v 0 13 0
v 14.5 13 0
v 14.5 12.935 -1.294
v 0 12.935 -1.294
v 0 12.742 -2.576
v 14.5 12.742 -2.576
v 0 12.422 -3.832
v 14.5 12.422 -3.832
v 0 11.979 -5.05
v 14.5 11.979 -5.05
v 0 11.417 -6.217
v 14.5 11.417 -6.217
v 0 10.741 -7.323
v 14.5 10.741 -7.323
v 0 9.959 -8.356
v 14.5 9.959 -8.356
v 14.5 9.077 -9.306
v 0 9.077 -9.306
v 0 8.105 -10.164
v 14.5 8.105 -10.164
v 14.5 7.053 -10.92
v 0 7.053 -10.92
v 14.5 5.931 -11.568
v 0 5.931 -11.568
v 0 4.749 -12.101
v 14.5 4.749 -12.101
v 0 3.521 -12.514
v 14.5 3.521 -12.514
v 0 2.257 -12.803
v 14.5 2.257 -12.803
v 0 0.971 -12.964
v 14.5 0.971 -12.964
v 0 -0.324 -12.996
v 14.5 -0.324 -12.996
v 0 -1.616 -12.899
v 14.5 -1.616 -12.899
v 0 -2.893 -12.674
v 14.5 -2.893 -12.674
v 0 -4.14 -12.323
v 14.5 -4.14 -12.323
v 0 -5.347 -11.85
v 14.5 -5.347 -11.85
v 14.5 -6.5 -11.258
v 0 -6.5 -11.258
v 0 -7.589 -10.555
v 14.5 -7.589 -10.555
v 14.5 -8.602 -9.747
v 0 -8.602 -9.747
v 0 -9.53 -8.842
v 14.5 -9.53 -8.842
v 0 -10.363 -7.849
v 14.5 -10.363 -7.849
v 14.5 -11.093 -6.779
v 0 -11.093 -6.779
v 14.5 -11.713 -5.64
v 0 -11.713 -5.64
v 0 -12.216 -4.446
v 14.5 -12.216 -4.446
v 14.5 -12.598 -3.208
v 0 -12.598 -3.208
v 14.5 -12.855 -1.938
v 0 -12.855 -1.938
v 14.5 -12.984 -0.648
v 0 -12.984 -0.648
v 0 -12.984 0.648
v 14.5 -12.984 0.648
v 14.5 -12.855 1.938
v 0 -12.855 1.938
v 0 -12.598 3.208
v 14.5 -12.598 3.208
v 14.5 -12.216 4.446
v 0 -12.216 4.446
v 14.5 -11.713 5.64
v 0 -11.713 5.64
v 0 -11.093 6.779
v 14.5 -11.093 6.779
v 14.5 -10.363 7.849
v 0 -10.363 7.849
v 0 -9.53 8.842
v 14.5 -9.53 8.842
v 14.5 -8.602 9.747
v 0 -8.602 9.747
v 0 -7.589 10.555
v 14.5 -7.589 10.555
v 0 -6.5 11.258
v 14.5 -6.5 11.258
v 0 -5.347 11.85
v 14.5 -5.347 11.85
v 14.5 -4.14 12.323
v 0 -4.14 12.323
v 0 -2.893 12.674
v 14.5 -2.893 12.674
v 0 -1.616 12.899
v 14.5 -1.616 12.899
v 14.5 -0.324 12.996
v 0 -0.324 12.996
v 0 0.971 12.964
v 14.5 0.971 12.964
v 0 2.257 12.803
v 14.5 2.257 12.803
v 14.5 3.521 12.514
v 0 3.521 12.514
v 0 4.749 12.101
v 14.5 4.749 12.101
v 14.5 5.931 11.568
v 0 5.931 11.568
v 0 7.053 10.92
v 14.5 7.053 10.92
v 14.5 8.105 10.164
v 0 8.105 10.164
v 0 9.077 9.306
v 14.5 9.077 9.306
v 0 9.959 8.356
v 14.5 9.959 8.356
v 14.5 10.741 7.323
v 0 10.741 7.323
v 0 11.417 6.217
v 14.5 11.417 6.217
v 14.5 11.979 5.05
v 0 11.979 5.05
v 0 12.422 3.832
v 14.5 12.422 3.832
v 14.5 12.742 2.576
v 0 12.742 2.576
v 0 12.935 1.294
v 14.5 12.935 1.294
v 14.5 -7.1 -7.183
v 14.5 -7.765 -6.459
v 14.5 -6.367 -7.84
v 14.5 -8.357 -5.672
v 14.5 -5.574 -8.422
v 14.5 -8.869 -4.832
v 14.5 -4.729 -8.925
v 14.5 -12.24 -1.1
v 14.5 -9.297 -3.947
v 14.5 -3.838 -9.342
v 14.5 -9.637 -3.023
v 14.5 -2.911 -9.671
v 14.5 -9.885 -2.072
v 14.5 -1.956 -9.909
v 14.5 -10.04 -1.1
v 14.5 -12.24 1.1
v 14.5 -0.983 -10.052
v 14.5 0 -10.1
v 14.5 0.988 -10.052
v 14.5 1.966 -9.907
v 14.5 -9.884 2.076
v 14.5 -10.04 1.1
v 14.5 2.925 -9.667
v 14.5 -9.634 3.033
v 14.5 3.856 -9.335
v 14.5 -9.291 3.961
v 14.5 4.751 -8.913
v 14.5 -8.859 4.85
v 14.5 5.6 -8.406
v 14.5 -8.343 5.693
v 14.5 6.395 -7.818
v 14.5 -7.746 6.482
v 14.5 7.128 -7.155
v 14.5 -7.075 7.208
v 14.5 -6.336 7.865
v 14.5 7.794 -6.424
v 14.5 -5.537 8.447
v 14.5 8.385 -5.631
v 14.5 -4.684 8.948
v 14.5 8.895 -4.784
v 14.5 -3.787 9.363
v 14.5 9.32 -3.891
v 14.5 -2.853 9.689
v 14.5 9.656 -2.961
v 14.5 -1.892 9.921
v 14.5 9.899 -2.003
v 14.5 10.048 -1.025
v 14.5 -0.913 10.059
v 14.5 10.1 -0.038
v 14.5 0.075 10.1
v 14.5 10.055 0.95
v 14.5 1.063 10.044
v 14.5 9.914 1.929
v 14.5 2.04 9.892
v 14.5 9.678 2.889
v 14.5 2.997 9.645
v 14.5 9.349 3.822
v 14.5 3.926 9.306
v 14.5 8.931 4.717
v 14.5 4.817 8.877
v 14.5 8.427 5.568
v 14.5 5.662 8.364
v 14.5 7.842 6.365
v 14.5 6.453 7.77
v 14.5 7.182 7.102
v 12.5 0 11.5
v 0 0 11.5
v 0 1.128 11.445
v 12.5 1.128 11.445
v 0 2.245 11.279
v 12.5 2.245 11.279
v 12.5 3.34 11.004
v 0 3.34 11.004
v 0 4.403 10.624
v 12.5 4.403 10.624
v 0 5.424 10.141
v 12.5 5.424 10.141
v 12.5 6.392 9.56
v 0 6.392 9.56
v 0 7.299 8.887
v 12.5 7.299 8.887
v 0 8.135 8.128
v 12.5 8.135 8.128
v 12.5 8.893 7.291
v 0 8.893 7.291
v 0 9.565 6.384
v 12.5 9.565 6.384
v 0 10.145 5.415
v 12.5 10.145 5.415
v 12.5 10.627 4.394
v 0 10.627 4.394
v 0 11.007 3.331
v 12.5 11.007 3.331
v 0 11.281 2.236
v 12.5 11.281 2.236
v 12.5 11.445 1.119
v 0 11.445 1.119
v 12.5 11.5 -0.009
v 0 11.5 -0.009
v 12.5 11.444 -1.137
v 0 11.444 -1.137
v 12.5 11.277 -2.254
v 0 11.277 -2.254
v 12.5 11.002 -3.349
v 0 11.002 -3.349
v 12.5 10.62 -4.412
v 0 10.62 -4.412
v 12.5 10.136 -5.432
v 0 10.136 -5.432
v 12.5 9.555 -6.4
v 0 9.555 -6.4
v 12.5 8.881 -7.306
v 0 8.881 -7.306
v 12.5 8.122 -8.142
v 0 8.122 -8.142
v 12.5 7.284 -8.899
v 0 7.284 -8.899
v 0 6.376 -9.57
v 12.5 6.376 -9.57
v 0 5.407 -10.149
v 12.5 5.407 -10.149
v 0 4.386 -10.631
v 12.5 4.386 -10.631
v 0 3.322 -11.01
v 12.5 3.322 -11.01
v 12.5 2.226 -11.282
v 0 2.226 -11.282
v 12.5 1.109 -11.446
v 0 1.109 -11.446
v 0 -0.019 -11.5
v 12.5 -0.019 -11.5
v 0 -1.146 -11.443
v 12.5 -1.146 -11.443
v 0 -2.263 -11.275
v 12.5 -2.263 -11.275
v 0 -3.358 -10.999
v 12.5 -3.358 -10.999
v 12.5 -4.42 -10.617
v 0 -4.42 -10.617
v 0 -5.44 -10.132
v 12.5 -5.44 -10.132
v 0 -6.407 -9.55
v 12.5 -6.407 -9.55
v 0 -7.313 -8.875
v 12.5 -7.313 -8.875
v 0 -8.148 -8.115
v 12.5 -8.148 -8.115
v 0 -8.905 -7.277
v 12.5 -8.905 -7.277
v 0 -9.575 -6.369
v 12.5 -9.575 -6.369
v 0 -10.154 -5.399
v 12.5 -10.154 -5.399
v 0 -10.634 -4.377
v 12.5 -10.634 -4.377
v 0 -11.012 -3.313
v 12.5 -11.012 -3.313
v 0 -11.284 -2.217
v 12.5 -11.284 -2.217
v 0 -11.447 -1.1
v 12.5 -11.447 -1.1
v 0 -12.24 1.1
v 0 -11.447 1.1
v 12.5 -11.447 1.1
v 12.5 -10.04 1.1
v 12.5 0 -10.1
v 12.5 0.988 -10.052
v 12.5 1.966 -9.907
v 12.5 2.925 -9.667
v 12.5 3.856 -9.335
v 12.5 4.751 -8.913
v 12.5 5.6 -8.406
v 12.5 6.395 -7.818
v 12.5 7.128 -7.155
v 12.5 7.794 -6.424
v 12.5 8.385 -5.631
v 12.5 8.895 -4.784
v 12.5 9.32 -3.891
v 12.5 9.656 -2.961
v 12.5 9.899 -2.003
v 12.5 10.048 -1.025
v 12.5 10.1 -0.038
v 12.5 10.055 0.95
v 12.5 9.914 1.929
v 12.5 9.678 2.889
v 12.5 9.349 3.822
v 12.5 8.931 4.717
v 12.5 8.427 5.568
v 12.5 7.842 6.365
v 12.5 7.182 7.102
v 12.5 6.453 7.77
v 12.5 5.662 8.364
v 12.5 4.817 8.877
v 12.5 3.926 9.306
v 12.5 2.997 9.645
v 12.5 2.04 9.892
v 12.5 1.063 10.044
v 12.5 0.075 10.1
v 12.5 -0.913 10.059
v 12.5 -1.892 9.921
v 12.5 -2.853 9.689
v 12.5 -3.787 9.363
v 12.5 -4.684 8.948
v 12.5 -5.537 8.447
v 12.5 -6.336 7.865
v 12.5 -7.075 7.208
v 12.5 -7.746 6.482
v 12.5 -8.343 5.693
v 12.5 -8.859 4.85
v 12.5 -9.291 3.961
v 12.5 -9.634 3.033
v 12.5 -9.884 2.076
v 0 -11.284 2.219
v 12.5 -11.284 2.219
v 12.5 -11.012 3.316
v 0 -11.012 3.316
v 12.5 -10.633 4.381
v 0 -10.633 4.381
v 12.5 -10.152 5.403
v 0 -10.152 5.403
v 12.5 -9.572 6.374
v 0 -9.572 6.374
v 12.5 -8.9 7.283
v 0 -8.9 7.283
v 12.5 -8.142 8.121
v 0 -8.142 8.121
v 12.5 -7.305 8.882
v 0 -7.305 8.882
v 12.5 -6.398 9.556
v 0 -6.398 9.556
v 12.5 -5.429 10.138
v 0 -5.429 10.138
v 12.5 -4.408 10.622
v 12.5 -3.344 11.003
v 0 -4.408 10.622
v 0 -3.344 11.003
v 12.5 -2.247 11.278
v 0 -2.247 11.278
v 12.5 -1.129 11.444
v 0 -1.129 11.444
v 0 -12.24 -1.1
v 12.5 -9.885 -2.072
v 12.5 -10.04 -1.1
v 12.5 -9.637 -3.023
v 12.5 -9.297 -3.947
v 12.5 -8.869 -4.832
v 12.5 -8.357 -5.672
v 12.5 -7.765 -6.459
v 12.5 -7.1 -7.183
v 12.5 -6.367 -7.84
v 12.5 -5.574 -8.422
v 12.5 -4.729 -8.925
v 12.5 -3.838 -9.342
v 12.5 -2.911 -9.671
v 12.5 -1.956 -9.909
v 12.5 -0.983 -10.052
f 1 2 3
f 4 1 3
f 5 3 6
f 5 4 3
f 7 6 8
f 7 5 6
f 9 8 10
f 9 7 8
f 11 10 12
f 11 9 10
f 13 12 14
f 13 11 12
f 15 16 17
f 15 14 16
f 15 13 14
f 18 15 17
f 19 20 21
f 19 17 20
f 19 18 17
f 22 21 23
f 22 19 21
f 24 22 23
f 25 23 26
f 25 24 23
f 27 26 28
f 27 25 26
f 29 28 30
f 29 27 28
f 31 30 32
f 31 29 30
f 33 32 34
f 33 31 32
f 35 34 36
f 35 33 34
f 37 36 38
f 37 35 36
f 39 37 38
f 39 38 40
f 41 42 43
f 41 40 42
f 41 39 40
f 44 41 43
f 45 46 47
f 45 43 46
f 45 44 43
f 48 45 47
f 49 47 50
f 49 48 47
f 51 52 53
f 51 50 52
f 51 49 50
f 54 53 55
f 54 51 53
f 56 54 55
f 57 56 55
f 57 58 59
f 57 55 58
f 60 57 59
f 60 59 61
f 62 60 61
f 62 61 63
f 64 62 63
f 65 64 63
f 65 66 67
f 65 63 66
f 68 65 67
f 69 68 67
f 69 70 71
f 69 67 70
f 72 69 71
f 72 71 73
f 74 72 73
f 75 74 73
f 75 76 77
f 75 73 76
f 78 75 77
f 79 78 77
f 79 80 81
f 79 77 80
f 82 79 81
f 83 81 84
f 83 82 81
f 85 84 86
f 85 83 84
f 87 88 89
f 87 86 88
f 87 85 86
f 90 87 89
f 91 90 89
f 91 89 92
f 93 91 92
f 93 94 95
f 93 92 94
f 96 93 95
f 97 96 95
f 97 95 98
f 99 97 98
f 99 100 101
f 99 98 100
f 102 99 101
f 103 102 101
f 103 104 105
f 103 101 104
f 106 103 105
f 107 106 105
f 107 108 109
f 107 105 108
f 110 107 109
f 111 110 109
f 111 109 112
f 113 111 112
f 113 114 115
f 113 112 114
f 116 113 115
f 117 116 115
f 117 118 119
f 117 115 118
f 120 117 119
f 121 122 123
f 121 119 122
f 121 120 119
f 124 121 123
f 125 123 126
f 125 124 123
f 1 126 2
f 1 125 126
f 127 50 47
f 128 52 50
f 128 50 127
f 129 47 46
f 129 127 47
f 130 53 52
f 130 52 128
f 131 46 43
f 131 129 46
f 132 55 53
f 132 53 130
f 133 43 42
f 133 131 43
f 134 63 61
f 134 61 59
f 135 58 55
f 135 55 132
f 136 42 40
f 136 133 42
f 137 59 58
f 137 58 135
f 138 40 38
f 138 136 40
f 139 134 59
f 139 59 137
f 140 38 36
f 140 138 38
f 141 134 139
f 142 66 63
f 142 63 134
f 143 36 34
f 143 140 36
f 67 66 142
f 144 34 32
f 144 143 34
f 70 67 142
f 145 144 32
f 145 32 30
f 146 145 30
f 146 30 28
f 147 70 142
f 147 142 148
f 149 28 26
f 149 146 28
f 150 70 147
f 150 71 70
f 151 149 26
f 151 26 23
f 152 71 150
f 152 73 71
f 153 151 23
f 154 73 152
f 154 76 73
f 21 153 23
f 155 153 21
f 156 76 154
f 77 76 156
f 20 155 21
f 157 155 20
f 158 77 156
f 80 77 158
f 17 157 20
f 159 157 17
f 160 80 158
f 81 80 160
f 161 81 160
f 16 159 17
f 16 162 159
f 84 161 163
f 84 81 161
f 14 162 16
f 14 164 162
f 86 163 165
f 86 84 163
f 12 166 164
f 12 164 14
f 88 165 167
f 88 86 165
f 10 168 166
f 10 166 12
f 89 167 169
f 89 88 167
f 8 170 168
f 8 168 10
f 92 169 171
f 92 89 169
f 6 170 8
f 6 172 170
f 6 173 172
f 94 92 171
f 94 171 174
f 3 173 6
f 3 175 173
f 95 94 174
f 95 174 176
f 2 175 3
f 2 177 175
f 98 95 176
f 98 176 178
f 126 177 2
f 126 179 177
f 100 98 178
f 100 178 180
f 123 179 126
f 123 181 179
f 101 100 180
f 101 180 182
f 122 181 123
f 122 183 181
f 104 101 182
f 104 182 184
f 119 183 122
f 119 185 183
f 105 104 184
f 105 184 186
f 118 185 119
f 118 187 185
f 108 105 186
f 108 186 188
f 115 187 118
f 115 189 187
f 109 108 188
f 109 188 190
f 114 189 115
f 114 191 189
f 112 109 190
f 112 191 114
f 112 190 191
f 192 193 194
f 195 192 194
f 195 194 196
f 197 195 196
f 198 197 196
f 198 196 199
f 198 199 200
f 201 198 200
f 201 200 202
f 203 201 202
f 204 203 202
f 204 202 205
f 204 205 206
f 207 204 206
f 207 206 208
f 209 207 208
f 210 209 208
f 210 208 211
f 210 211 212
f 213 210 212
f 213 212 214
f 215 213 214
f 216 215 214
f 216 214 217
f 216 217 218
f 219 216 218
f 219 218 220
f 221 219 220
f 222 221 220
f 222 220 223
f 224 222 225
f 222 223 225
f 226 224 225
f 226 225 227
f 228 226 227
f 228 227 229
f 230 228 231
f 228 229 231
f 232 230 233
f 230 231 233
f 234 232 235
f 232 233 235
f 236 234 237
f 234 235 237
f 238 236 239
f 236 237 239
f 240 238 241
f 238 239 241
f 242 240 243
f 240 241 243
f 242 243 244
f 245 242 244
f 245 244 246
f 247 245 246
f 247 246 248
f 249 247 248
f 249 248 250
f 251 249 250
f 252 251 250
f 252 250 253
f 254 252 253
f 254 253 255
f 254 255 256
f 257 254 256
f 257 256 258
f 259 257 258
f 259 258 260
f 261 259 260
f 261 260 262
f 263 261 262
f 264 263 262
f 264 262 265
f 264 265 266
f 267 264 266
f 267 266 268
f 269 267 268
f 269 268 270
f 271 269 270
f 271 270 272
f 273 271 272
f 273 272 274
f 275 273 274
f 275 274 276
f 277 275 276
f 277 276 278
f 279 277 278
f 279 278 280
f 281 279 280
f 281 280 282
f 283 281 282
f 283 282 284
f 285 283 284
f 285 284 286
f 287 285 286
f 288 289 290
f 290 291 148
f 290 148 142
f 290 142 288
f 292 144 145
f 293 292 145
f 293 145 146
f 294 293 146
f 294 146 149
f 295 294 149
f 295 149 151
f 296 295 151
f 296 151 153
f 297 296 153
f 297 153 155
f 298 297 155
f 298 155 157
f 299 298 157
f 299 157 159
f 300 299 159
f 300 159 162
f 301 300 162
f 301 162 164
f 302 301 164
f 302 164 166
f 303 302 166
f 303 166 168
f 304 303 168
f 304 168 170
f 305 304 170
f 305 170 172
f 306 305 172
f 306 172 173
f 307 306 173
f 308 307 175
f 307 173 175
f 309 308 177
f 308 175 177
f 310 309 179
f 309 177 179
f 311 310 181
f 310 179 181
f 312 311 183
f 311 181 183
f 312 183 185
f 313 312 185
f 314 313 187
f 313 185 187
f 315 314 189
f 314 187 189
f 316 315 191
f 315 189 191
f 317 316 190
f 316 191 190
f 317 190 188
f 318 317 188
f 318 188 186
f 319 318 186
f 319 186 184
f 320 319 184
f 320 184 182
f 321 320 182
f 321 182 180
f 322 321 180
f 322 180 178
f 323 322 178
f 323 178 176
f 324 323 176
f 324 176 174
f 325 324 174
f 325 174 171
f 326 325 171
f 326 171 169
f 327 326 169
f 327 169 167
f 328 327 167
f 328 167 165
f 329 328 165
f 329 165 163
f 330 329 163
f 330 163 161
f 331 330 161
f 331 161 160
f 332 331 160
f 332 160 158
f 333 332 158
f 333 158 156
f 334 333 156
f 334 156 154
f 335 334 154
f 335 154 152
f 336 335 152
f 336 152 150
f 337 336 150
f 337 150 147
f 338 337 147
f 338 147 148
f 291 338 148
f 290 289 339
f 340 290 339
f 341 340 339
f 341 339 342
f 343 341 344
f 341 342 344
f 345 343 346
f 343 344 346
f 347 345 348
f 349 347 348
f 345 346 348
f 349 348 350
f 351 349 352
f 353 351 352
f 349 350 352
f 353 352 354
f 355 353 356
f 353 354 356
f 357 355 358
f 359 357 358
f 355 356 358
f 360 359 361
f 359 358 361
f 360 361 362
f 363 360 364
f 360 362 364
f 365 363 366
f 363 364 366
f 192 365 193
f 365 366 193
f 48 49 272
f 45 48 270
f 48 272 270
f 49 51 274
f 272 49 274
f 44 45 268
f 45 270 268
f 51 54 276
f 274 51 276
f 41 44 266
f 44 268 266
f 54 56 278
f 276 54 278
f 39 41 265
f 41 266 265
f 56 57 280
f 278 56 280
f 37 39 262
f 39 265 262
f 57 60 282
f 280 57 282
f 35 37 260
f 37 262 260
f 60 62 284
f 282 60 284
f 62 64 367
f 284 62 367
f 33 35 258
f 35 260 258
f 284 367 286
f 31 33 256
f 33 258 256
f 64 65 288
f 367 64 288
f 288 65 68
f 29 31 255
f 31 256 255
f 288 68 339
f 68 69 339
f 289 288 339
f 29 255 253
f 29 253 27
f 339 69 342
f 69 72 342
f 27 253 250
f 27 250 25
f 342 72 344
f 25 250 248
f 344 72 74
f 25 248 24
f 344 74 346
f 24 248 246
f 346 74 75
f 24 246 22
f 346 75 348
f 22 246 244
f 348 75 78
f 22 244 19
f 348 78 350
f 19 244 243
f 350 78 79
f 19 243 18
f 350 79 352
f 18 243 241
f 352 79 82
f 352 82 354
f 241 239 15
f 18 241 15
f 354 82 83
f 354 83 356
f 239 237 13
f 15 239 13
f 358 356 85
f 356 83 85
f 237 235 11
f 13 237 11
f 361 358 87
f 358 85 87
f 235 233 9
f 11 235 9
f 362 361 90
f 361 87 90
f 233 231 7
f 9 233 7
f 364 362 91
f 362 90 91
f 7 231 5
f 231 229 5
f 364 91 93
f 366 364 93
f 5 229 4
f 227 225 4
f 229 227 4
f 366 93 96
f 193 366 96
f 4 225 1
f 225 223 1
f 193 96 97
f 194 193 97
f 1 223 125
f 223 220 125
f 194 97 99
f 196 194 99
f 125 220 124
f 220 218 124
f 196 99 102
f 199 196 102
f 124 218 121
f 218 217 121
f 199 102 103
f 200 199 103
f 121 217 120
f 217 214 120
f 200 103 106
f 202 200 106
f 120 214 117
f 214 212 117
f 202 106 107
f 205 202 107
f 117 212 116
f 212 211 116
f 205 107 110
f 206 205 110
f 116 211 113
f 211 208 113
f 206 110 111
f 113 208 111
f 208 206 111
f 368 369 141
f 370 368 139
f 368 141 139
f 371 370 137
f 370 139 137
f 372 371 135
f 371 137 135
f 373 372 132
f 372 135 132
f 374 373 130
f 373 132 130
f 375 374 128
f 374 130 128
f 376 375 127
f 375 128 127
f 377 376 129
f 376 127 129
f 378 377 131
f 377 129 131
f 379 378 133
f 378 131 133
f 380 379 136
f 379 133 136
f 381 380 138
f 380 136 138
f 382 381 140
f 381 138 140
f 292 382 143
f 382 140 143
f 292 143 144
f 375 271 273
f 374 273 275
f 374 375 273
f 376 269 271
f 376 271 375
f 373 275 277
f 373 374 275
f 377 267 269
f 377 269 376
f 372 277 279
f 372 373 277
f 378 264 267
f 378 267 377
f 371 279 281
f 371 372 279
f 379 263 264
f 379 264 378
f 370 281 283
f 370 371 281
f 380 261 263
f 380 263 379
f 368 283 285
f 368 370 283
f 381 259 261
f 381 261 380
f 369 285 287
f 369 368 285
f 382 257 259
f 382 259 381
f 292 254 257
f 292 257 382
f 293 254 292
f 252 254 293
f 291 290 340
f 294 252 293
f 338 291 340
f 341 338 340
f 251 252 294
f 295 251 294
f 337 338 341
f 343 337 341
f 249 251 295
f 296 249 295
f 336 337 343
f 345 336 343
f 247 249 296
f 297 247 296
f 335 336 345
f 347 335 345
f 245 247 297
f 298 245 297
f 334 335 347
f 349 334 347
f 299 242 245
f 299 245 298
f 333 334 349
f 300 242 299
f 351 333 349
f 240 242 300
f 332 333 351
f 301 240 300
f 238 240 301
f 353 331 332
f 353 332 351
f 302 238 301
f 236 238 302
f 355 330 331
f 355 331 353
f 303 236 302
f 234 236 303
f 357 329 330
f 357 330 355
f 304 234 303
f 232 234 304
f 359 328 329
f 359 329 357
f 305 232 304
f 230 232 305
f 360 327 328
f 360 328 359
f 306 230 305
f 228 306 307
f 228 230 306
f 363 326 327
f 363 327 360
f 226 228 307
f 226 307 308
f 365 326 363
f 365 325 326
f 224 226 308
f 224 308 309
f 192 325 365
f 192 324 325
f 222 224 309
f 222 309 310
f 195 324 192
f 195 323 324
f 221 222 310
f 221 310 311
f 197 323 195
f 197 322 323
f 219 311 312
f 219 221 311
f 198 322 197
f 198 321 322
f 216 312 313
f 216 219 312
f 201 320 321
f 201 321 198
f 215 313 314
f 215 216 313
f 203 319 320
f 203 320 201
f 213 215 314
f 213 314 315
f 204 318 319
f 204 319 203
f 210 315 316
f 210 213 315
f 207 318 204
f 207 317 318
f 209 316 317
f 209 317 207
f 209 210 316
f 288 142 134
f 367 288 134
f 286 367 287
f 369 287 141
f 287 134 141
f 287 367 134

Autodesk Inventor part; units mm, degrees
ref_plane "YZ Plane" through (0, 0, 0) normal (1, 0, 0) x (0, 1, 0)
ref_plane "XZ Plane" through (0, 0, 0) normal (0, 1, 0) x (-1, 0, 0)
ref_plane "XY Plane" through (0, 0, 0) normal (0, 0, 1) x (1, 0, 0)
sketch "Sketch1" plane through (0, 0, 0) normal (1, 0, 0) x (0, 1, 0)
  circle A0 centre (0, 0) radius 13
  dimension "d0" = 26
extrude "Extrusion1" add sketch "Sketch1" along normal blind 14.5
sketch "Sketch2" plane through (0, 0, 0) normal (-1, 0, 0) x (0, 0, 1)
  circle A0 centre (0, 0) radius 13 projected
  circle A1 centre (0, 0) radius 11.5
  dimension "d3" = 23
extrude "Extrusion2" cut sketch "Sketch2" against normal blind 12.5 contours A1
sketch "Sketch3" plane through (14.5, 0, 0) normal (1, 0, 0) x (0, 0, -1)
  circle A0 centre (0, 0) radius 13 projected
  circle A1 centre (0, 0) radius 10.1
  dimension "d6" = 20.2
extrude "Extrusion3" cut sketch "Sketch3" against normal through all contours A1
sketch "Sketch4" plane through (14.5, 0, 0) normal (1, 0, 0) x (0, 0, -1)
  circle A0 centre (0, 0) radius 10.1 projected
  circle A1 centre (0, 0) radius 13 projected
  circle A2 centre (0, 0) radius 10.1 projected
  line L0 (-1.1, -10.0399) -> (-1.1, -12.2399)
  line L1 (-1.1, -12.2399) -> (1.1, -12.2399)
  line L2 (1.1, -12.2399) -> (1.1, -10.0399)
  dimension "d9" = 2.2
extrude "Extrusion4" cut sketch "Sketch4" against normal through all contours A0 L2 L1 L0
properties part number "Button-NUC-Mount"
